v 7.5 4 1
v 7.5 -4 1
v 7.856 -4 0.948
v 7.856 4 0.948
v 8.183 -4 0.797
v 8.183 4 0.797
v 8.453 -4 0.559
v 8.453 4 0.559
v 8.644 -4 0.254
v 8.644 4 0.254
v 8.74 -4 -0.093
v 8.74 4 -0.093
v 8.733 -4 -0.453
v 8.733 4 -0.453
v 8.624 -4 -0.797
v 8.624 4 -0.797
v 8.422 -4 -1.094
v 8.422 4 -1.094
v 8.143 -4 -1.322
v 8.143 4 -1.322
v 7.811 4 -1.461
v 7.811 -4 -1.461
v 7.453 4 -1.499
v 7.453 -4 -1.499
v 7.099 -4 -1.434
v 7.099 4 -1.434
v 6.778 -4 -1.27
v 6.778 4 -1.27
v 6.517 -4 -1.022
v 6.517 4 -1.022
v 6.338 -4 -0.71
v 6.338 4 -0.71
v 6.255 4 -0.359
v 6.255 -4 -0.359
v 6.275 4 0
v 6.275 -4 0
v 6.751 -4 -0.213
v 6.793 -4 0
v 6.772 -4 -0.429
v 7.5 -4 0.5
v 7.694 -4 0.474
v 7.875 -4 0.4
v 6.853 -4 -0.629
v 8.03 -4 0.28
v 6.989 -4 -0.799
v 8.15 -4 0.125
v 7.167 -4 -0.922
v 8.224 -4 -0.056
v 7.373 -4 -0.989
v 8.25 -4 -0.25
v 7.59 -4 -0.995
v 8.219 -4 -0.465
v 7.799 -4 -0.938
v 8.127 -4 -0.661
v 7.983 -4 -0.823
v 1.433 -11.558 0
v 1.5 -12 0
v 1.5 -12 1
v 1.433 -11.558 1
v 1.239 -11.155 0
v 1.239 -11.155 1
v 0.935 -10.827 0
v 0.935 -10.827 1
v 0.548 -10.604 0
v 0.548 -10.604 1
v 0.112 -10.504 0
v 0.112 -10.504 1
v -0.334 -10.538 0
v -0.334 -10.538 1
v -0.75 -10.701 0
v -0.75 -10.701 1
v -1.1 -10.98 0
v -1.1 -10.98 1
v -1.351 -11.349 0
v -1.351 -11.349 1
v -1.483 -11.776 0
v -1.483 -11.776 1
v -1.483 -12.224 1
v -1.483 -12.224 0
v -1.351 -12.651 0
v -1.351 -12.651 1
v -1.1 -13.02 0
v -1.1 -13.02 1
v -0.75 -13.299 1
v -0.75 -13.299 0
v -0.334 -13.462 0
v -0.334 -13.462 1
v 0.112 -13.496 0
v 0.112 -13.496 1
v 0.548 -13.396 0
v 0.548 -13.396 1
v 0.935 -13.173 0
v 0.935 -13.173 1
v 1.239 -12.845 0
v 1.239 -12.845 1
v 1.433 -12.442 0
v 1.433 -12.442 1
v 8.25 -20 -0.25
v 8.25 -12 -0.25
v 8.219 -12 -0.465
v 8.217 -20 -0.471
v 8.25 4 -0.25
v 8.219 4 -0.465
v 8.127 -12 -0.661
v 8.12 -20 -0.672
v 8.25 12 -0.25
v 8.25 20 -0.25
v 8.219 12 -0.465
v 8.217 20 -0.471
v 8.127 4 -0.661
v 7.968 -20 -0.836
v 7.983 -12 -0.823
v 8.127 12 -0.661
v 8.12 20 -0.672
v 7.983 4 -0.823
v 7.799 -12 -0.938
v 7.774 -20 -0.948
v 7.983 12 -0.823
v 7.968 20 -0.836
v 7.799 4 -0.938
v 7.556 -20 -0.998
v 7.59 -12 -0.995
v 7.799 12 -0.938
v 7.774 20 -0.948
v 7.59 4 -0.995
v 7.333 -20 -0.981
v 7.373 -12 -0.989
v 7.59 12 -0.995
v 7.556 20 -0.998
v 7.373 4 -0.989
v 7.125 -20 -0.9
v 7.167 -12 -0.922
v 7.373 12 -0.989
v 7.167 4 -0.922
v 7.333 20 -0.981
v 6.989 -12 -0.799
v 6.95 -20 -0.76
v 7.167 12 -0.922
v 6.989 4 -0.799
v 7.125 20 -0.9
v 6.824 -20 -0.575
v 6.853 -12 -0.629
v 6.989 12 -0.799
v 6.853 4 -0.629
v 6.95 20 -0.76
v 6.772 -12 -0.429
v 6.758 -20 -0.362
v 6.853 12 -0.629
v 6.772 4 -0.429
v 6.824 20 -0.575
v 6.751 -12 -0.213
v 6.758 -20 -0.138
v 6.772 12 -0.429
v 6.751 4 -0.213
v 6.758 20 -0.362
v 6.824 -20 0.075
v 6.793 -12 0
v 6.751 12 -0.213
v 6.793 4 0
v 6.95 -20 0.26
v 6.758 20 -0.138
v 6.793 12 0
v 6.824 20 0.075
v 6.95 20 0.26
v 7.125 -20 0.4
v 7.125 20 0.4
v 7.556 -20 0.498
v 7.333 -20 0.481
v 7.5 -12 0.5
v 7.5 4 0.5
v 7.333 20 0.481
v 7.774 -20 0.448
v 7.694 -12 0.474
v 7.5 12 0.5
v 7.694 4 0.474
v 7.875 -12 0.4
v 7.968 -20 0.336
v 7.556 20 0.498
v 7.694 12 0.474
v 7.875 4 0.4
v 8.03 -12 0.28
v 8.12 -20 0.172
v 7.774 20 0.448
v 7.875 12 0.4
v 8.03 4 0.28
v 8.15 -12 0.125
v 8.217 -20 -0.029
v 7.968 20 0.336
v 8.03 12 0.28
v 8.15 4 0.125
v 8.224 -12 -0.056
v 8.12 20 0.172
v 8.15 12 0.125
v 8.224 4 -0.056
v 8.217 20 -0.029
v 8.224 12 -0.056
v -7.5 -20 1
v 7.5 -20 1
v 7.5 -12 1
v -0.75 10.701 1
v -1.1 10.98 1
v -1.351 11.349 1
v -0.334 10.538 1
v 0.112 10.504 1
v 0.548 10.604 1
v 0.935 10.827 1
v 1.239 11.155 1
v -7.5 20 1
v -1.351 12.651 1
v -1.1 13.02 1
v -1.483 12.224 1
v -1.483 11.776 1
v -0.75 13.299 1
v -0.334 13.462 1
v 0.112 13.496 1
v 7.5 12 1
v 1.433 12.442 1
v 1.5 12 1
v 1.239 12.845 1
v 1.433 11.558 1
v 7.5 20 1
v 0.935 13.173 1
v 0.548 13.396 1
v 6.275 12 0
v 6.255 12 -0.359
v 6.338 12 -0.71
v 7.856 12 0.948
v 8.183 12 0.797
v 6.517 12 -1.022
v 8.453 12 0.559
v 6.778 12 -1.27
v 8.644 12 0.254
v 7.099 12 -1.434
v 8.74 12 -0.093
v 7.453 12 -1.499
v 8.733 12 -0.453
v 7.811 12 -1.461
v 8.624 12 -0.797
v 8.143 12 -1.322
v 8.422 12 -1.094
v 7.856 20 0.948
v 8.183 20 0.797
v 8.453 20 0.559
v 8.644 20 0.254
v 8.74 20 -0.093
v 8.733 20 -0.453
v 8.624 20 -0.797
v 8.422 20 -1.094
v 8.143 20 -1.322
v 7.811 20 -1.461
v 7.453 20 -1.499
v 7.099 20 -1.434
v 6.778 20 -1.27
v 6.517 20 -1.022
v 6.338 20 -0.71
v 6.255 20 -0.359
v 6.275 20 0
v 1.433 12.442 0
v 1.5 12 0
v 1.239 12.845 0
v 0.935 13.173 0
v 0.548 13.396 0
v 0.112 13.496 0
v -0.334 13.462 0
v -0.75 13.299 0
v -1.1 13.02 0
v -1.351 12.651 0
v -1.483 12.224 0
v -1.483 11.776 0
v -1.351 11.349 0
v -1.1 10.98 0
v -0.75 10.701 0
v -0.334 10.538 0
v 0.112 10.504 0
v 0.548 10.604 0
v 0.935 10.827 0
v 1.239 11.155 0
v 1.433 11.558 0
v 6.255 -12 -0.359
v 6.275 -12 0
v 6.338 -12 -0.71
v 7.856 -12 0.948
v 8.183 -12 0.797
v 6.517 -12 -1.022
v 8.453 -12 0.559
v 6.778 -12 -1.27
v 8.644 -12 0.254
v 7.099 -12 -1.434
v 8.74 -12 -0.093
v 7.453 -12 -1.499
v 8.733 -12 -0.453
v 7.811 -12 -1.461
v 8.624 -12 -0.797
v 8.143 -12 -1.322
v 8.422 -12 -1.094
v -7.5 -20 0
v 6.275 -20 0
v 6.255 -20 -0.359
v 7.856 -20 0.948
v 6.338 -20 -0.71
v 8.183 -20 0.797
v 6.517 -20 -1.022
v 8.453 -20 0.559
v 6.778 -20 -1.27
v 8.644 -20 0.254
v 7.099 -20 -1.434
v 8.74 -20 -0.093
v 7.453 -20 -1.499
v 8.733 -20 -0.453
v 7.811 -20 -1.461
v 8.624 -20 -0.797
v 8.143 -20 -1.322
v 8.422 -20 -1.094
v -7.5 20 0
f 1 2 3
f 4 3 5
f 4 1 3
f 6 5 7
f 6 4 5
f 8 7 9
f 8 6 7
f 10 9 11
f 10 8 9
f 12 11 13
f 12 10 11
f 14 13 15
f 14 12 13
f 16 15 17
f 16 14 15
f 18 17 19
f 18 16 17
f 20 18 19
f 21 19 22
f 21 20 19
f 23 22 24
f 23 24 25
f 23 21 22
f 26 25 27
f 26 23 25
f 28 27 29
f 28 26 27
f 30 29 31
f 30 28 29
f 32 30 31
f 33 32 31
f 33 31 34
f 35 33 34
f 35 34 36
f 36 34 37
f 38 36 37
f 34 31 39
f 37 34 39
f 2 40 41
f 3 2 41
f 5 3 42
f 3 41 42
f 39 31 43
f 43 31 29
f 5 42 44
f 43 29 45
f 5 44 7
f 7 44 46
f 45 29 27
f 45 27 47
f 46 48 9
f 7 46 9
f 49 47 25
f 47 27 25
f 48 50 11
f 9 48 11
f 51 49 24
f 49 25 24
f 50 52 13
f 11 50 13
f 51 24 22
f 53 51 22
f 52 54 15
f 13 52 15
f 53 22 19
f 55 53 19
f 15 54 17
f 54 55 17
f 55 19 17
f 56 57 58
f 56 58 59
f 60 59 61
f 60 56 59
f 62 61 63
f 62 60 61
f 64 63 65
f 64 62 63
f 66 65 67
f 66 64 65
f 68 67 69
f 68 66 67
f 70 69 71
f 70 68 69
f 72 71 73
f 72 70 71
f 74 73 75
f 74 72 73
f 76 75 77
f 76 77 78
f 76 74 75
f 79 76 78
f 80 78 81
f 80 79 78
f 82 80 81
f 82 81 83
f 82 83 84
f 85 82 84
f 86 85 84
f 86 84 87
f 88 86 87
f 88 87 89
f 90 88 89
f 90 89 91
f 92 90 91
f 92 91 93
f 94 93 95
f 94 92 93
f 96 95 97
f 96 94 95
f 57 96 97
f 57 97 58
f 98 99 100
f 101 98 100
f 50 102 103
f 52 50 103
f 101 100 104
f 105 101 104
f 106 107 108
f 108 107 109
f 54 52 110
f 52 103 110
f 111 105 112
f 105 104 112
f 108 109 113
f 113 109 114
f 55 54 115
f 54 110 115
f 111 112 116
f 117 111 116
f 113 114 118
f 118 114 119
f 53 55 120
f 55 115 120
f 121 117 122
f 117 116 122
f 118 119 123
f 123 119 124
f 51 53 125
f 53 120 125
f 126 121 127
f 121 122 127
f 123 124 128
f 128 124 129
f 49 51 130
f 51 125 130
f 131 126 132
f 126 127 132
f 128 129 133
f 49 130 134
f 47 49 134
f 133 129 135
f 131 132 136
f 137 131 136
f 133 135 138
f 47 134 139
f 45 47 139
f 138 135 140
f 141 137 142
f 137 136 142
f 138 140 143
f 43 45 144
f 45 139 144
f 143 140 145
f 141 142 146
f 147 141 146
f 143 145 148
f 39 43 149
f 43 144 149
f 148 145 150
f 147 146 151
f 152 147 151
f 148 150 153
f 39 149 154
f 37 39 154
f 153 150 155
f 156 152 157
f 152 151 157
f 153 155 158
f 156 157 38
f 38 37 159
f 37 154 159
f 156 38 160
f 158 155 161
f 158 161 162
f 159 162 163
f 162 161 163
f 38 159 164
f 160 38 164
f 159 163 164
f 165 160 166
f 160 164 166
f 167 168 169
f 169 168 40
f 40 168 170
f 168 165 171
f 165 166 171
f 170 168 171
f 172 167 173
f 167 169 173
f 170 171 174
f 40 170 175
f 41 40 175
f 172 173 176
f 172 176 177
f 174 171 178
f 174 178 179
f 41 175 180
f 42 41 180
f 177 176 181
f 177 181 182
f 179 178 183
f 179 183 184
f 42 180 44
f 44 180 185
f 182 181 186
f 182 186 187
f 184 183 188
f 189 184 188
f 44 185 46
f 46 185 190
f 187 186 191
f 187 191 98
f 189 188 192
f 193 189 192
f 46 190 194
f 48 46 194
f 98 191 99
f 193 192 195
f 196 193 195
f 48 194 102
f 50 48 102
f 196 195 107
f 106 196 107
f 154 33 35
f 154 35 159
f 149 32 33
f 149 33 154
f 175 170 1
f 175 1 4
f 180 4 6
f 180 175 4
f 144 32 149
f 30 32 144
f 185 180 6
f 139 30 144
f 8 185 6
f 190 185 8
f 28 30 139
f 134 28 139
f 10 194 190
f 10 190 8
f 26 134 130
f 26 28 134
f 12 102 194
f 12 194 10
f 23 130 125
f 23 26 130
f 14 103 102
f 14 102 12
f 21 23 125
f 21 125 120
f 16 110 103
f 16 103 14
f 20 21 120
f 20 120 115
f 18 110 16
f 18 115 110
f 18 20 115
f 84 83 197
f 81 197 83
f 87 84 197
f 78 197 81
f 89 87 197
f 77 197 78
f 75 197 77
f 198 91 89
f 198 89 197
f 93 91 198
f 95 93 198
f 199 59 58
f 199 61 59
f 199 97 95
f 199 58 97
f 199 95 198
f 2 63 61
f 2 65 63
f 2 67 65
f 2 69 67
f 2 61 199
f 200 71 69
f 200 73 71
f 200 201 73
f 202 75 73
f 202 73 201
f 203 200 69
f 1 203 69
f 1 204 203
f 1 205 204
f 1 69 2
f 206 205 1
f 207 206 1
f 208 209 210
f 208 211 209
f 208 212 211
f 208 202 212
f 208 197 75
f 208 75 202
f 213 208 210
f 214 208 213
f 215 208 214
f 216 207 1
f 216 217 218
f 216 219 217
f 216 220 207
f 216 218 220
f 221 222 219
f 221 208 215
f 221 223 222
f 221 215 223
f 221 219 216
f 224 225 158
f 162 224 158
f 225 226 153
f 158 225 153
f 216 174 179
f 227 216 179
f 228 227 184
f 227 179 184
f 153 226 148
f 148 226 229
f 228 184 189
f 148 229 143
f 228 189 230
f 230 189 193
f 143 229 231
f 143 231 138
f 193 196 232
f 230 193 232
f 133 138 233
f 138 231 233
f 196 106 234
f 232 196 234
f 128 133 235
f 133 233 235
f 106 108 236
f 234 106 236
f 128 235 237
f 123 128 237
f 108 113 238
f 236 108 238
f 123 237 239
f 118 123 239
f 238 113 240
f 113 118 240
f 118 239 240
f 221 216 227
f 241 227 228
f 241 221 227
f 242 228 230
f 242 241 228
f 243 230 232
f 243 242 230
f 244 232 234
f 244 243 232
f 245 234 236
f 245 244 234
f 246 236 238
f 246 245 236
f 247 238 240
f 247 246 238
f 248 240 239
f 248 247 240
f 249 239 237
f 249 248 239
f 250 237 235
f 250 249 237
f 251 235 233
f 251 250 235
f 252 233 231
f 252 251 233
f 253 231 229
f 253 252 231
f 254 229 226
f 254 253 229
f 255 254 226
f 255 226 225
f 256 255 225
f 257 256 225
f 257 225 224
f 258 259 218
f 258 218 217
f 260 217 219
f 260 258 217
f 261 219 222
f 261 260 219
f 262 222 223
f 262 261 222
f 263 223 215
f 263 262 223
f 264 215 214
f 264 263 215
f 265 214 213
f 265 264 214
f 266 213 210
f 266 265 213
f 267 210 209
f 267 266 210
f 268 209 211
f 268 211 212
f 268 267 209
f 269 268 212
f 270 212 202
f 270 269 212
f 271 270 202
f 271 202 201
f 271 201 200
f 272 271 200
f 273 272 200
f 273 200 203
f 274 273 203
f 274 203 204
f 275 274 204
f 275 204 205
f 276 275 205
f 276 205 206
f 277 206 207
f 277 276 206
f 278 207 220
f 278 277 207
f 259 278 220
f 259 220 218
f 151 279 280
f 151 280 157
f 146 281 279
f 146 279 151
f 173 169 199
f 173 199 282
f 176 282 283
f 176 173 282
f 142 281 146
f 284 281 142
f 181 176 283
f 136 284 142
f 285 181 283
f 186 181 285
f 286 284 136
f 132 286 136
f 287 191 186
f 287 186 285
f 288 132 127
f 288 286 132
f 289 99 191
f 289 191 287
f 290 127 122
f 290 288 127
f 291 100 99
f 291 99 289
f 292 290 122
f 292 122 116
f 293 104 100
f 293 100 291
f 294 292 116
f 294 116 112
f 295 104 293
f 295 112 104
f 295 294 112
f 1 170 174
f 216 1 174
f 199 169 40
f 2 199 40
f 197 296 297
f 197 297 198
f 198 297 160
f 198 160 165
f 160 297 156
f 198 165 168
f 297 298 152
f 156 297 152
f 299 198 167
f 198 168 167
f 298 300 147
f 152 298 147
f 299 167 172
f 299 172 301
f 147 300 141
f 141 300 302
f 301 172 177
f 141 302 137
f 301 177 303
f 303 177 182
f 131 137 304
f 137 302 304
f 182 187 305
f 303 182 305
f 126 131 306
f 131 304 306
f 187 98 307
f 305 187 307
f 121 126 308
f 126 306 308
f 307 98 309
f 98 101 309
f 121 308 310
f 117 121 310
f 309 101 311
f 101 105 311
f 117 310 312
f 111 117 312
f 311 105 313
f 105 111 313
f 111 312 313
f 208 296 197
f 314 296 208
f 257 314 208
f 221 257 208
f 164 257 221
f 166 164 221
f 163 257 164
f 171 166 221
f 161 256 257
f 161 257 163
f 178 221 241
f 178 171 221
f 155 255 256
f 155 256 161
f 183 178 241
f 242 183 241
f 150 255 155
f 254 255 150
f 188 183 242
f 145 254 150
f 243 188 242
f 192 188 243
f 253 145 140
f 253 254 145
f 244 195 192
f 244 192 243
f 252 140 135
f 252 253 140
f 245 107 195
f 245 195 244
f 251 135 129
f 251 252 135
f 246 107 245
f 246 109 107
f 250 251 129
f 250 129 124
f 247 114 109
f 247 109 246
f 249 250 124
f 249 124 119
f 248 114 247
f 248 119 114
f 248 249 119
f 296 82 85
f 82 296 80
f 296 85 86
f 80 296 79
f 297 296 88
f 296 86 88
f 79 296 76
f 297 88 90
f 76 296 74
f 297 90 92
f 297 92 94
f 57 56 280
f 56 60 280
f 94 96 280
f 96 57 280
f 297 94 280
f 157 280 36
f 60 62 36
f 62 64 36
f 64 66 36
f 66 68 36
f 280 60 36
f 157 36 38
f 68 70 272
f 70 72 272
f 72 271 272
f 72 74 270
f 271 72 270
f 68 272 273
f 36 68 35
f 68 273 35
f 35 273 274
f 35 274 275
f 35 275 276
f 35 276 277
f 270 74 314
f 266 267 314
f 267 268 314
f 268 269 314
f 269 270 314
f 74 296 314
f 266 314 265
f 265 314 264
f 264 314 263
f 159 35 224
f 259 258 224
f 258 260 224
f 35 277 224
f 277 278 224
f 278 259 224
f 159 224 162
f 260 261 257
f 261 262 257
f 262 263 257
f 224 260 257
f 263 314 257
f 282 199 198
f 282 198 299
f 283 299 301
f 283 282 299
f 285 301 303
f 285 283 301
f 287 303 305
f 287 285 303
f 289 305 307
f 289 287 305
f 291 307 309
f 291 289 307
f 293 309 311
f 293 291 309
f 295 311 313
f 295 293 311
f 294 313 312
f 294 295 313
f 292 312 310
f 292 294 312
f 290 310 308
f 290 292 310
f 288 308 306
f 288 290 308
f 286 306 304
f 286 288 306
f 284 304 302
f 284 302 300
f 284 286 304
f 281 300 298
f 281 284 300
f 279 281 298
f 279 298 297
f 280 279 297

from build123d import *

# Parameters (mm, degrees)
SKETCH1_W           = 15
SKETCH1_H           = 40
SKETCH1_R           = 1.5
BOSS_EXTRUDE2_DEPTH = 1
SKETCH2_R           = 1.25
BOSS_EXTRUDE3_DEPTH = 8
SKETCH3_R           = 0.75
CUT_EXTRUDE1_DEPTH  = 40
LPATTERN1_COUNT     = 3
LPATTERN1_PITCH     = 16
SKETCH4_R           = 0.75
CUT_EXTRUDE2_DEPTH  = 40


with BuildPart() as part:
    # Sketch1 → Boss-Extrude2 (new body)
    with BuildSketch(Plane.XY):
        Rectangle(SKETCH1_W, SKETCH1_H)
        with Locations((0, 12)):
            Circle(SKETCH1_R, mode=Mode.SUBTRACT)
        with Locations((0, -12)):
            Circle(SKETCH1_R, mode=Mode.SUBTRACT)
    extrude(amount=BOSS_EXTRUDE2_DEPTH)

    # Sketch2 → Boss-Extrude3 (add)
    with BuildSketch(Plane(origin=(0, 20, 0), x_dir=(1, 0, 0), z_dir=(0, 1, 0))):
        with Locations((7.5, 0.25)):
            Circle(SKETCH2_R)
    boss_extrude3 = extrude(amount=-BOSS_EXTRUDE3_DEPTH)

    # Sketch3 → Cut-Extrude1 (cut)
    with BuildSketch(Plane(origin=(0, 20, 0), x_dir=(1, 0, 0), z_dir=(0, 1, 0))):
        with Locations((7.5, 0.25)):
            Circle(SKETCH3_R)
    extrude(amount=-CUT_EXTRUDE1_DEPTH, mode=Mode.SUBTRACT)

    # LPattern1: Boss-Extrude3 ×3
    with Locations(*[(0, -i * LPATTERN1_PITCH, 0) for i in range(1, LPATTERN1_COUNT)]):
        add(boss_extrude3)

    # Sketch4 → Cut-Extrude2 (cut)
    with BuildSketch(Plane(origin=(0, 20, 0), x_dir=(1, 0, 0), z_dir=(0, 1, 0))):
        with Locations((7.5, 0.25)):
            Circle(SKETCH4_R)
    extrude(amount=-CUT_EXTRUDE2_DEPTH, mode=Mode.SUBTRACT)


solid = part.part
